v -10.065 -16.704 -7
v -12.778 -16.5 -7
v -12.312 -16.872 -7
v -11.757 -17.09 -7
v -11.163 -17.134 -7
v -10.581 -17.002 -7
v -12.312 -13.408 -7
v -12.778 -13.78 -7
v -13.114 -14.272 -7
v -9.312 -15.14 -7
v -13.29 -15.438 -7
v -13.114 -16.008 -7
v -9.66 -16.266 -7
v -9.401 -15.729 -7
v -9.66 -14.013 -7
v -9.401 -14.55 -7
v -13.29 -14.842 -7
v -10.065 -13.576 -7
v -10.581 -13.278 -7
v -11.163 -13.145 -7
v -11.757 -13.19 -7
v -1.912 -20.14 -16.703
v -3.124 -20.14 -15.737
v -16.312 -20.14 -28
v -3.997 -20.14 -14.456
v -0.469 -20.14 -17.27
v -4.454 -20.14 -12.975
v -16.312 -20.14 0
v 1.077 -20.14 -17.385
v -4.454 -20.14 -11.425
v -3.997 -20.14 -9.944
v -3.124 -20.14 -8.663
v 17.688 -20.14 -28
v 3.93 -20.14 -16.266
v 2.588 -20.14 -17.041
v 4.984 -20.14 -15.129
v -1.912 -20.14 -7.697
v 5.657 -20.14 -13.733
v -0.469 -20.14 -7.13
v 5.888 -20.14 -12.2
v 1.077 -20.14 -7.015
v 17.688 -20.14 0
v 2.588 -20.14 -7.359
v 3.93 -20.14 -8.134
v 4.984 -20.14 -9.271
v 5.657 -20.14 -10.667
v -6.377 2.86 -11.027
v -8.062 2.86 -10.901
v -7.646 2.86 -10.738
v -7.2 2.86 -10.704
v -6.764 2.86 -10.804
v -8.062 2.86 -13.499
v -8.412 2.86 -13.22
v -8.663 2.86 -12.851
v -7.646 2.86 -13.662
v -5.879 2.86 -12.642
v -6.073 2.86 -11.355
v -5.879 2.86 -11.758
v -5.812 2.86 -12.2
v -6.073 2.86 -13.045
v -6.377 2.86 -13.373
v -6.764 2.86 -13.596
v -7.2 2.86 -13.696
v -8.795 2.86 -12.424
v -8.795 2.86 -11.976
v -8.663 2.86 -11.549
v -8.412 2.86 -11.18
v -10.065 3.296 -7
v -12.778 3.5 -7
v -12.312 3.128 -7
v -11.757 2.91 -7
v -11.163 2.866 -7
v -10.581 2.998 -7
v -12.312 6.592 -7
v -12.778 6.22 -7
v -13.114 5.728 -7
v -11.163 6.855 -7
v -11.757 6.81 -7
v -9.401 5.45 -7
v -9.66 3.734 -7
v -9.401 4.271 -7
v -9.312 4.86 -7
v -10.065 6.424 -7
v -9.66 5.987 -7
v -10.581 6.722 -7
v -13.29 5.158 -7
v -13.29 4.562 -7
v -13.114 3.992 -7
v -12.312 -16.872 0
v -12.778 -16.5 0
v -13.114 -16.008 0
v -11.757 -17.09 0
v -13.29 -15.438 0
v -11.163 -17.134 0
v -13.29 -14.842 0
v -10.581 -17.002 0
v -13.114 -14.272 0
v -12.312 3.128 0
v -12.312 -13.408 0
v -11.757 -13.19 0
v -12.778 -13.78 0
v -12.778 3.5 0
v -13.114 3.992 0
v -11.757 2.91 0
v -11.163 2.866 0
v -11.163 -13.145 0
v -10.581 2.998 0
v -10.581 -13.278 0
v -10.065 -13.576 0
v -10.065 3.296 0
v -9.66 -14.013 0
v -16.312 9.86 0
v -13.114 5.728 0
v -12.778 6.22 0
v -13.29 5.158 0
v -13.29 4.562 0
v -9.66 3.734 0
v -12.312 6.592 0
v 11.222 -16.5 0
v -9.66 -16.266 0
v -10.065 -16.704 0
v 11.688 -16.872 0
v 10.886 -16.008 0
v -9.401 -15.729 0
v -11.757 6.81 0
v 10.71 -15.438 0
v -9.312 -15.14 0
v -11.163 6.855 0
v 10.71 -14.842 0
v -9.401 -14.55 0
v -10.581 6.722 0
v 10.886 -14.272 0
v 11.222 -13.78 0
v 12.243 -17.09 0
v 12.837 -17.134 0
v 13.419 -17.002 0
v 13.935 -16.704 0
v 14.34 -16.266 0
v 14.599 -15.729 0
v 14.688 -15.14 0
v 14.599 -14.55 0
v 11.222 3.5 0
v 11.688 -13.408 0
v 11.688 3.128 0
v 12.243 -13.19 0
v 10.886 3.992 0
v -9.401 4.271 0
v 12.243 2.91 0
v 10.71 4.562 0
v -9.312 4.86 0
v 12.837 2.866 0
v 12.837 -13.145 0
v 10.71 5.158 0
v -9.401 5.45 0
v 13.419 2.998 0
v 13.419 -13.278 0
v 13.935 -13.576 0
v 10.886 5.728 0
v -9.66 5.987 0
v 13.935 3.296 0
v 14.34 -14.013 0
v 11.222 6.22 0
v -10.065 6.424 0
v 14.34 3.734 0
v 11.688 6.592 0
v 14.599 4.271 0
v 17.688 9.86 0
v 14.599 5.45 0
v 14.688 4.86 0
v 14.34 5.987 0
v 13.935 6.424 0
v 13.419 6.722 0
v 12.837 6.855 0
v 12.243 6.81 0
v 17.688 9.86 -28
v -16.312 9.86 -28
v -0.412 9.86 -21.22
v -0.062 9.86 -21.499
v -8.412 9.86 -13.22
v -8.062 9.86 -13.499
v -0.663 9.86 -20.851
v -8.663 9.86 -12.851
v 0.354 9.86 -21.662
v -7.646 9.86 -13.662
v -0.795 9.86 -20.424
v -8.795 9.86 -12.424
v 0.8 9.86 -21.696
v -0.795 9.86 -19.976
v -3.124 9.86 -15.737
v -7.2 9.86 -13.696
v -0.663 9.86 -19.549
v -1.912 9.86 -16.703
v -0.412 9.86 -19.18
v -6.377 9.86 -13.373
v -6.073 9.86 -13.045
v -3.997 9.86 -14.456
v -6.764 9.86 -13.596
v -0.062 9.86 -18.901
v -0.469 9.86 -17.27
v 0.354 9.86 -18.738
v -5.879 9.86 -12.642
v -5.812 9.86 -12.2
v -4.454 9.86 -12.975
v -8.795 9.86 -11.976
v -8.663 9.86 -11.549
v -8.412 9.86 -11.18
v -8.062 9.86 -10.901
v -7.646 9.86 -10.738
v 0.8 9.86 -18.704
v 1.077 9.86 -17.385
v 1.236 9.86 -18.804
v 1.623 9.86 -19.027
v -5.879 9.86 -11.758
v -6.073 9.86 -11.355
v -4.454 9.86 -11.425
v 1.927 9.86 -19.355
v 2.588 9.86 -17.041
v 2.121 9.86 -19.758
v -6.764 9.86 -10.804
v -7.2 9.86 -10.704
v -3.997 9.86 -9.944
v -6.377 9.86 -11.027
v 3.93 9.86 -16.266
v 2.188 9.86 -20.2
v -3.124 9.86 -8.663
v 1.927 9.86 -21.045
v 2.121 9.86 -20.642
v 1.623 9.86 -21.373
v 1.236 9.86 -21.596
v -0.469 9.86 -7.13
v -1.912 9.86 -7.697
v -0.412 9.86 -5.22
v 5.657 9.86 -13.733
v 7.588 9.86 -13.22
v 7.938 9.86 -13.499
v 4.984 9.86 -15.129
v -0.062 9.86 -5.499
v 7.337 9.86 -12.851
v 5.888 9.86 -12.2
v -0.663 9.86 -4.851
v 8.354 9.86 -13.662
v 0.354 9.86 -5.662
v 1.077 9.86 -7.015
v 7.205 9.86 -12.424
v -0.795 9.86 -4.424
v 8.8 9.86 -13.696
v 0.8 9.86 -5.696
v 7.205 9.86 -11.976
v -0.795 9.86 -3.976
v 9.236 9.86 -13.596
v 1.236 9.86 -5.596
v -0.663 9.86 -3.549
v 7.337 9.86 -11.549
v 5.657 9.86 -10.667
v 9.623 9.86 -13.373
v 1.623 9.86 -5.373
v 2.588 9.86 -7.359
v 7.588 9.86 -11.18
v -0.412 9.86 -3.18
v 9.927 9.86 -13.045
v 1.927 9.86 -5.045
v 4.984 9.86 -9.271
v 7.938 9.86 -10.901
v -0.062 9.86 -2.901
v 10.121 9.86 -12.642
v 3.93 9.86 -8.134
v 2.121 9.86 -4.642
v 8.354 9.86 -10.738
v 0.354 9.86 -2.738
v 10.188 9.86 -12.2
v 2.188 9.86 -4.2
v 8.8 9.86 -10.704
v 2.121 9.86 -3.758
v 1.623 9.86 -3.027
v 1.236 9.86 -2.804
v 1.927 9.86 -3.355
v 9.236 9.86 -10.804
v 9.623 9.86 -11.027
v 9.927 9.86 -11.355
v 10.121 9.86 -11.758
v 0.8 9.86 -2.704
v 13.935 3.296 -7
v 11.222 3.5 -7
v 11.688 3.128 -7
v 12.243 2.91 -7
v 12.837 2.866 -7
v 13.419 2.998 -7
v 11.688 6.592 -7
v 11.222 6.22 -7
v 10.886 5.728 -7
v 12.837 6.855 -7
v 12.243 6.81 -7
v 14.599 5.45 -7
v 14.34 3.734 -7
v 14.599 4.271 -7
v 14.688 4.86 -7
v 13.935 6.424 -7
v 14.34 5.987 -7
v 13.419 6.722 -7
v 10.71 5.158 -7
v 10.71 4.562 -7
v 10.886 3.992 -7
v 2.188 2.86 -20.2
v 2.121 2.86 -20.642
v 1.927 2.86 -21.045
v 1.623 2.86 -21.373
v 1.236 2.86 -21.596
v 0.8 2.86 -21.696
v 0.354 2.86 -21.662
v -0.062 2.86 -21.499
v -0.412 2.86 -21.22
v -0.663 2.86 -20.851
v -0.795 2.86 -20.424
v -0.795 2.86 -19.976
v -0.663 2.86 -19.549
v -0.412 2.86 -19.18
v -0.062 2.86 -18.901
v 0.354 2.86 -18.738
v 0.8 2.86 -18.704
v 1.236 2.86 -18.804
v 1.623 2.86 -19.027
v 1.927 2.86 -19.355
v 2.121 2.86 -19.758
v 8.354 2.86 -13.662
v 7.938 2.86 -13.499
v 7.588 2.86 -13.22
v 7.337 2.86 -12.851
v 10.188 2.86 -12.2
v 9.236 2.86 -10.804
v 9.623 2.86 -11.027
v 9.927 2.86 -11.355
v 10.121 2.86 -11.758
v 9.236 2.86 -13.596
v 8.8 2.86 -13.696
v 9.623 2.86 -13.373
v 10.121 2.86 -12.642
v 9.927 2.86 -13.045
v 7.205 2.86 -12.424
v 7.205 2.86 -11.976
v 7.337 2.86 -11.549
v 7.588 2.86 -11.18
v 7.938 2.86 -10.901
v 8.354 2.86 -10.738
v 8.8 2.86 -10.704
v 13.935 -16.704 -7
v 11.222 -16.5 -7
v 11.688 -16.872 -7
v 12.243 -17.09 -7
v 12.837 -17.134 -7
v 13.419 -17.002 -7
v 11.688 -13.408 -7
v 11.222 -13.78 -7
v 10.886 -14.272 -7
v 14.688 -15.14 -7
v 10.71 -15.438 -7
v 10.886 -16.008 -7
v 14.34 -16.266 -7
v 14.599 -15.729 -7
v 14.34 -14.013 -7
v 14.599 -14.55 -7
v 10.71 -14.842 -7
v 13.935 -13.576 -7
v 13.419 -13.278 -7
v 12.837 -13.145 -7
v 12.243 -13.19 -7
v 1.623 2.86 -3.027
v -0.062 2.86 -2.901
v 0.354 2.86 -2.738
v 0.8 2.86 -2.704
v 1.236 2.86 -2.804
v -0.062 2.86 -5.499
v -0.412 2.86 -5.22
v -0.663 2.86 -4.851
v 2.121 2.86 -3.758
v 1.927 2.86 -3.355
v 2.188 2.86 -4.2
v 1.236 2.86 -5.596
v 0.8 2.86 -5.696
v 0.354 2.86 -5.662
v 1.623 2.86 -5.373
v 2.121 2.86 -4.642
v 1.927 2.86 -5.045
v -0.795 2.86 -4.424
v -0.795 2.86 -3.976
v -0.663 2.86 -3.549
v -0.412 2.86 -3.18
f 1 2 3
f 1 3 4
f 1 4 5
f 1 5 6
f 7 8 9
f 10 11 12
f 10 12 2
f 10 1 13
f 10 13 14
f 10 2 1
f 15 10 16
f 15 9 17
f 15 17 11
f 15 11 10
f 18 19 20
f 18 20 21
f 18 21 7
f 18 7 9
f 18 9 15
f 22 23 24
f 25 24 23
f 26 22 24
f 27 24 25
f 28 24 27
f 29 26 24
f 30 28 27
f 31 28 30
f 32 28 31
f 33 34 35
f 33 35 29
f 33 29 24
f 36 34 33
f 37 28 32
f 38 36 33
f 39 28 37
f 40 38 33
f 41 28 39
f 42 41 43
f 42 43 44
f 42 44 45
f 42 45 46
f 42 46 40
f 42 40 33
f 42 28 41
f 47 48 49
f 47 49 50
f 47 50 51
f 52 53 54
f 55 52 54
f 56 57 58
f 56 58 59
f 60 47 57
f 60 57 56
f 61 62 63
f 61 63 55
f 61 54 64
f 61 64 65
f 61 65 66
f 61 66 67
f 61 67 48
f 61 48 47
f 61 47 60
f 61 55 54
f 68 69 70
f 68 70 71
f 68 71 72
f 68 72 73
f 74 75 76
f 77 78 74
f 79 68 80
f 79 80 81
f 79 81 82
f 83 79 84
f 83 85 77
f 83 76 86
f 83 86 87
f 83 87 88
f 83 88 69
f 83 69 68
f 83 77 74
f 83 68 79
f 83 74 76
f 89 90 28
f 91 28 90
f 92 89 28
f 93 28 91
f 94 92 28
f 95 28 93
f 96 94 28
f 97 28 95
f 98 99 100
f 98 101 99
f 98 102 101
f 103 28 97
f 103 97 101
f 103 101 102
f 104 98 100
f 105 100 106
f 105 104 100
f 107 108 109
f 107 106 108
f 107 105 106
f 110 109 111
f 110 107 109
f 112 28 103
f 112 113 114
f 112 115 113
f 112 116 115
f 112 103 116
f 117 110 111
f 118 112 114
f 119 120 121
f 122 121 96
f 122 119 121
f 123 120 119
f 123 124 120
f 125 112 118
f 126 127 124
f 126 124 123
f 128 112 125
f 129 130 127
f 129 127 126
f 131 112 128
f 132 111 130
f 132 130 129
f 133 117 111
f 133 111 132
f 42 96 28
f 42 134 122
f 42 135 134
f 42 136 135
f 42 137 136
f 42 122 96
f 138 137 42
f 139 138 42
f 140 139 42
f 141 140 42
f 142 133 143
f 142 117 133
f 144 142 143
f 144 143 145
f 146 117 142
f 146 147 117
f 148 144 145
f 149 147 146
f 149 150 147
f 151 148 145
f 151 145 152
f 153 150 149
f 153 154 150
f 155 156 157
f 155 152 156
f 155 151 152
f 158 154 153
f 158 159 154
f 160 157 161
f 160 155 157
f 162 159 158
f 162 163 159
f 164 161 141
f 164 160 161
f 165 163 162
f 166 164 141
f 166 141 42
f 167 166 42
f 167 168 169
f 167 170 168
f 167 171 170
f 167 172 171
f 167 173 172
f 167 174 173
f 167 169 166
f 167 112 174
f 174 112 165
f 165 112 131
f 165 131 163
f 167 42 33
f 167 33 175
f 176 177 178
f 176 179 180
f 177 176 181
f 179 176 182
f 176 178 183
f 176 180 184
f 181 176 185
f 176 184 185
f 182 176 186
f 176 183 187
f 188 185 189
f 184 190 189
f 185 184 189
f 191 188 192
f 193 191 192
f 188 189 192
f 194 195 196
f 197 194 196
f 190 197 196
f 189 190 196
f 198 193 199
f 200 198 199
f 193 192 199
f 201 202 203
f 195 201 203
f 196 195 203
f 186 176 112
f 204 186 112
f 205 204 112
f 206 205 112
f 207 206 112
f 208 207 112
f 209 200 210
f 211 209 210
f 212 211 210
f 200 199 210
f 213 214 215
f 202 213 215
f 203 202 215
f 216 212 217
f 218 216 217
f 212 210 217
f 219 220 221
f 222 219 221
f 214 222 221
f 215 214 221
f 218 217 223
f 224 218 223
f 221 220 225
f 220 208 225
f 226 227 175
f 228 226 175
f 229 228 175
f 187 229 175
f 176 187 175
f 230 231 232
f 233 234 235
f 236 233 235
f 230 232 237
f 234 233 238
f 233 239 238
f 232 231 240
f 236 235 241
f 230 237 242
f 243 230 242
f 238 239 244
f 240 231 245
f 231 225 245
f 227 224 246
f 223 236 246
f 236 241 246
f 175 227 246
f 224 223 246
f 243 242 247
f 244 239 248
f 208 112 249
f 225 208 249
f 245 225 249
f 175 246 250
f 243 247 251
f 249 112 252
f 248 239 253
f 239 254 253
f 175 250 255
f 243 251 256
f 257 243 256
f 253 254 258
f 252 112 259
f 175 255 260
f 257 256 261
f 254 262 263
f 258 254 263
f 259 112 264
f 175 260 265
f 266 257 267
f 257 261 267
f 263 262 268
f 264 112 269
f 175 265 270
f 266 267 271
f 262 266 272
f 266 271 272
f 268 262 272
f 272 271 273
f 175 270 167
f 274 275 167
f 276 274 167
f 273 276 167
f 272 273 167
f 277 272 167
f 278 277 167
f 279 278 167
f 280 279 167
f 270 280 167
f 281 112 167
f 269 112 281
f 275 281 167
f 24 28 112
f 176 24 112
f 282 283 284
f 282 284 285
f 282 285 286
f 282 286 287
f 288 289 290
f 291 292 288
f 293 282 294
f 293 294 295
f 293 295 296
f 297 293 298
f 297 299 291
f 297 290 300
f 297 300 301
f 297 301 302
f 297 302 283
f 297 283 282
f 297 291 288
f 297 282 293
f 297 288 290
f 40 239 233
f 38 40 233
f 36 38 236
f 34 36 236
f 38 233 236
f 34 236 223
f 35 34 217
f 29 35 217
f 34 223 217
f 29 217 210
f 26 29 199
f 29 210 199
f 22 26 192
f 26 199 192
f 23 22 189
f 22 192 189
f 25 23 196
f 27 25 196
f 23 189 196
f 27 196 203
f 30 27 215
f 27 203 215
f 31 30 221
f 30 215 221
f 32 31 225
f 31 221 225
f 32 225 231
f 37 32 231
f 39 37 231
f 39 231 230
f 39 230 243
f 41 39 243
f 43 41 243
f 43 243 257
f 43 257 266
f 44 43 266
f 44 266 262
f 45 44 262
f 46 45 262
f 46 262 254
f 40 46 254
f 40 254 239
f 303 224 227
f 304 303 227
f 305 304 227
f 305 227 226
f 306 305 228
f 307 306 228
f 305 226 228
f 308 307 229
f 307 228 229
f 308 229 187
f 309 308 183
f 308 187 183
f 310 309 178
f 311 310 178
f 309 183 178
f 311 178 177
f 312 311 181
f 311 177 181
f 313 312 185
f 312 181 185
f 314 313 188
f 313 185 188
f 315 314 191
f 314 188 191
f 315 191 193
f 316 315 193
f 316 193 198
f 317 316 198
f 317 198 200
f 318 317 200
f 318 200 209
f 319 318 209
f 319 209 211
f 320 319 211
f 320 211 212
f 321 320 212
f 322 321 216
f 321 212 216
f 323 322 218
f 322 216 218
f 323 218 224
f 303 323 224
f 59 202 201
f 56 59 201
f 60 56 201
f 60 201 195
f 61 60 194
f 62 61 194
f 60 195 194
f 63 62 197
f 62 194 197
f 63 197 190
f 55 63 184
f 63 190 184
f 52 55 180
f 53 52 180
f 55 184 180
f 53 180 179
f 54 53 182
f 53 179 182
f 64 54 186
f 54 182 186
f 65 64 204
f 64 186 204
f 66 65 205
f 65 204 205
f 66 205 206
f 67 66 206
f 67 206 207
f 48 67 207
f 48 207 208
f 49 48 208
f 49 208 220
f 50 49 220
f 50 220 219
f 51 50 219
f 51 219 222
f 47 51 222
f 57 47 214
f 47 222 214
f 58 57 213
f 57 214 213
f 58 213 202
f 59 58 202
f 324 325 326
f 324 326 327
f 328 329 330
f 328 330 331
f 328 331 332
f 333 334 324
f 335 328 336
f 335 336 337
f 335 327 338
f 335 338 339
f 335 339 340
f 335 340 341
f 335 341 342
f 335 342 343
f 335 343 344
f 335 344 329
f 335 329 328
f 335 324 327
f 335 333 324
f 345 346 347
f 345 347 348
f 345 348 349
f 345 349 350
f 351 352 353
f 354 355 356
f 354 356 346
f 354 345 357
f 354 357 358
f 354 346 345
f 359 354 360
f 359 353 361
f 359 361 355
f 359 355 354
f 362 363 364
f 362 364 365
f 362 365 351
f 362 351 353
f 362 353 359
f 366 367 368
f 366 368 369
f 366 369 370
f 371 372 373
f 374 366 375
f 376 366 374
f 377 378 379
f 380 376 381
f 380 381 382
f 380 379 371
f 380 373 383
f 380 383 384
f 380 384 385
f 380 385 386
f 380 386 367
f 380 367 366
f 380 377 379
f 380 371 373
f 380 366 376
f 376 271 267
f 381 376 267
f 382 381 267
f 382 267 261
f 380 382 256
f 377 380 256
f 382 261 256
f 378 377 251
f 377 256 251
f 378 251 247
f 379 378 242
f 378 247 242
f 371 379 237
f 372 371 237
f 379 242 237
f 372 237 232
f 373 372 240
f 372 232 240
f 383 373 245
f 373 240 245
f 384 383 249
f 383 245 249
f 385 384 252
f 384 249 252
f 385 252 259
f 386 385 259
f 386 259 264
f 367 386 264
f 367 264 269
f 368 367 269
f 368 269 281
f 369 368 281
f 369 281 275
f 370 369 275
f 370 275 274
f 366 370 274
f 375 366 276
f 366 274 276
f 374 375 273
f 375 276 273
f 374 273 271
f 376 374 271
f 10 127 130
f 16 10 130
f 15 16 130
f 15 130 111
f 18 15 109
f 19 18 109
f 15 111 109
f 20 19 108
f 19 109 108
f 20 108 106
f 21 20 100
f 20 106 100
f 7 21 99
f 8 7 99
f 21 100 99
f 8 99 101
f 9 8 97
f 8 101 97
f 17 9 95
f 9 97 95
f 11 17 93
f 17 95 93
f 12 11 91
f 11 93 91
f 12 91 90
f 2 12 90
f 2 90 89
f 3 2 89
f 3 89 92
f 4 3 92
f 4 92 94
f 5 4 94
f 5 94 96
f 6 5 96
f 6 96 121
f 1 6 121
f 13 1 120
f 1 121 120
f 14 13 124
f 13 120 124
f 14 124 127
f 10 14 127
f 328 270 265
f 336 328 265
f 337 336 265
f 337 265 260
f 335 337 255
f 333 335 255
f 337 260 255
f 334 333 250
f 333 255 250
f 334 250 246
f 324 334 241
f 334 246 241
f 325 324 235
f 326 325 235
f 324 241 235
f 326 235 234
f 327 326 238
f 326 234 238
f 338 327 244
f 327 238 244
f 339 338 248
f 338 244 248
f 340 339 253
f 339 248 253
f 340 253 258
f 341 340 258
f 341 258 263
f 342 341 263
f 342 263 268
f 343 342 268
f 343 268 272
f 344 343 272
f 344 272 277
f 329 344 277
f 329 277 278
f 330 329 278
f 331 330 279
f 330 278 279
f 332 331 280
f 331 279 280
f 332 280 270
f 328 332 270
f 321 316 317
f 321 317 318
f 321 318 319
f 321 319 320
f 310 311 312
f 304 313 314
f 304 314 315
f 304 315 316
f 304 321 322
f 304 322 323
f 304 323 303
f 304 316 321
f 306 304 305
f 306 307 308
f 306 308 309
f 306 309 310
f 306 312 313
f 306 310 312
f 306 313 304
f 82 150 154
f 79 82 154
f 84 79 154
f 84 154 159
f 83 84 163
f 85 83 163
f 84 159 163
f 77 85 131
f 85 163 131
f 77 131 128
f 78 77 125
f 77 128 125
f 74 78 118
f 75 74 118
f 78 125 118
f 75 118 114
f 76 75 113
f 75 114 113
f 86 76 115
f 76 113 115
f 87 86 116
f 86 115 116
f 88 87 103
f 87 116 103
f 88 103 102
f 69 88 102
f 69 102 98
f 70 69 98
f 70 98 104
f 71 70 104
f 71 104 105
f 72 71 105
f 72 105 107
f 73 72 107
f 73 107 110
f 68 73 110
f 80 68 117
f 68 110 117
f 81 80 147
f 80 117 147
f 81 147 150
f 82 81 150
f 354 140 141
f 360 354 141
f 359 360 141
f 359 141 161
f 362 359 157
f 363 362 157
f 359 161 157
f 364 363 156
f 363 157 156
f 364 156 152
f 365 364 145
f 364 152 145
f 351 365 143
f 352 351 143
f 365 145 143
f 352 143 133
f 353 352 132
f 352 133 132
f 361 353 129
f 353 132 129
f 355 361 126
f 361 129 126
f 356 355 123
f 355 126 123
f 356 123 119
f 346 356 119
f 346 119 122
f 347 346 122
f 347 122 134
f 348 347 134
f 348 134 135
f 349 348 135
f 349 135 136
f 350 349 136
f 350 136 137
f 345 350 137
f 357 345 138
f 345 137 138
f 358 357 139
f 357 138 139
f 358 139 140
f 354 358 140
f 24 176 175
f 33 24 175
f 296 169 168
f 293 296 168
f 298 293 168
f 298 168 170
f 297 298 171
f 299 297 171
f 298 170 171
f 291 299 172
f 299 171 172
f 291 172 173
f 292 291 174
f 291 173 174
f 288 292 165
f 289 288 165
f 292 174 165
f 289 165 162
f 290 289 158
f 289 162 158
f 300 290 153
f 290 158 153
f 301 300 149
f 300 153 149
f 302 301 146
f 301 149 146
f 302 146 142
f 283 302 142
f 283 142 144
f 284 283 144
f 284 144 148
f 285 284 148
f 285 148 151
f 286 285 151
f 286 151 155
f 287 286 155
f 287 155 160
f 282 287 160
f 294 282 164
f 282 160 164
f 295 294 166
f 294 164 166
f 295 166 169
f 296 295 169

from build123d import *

# Parameters (mm, degrees)
SKETCH_1_W          = 34
SKETCH_1_H          = 30
EXTRUDE_1_DEPTH     = 28
SKETCH_2_R          = 2
CUT_EXTRUDE_1_DEPTH = 7
SKETCH_3_R          = 5.2
CUT_EXTRUDE_3_DEPTH = 31
SKETCH_5_R          = 1.5
CUT_EXTRUDE_4_DEPTH = 7


with BuildPart() as part:
    # 草图1 → 凸台-拉伸1 (new body)
    with BuildSketch(Plane.XY):
        with Locations((0.688013078, -5.139852888)):
            Rectangle(SKETCH_1_W, SKETCH_1_H)
    extrude(amount=-EXTRUDE_1_DEPTH)

    # 草图2 → 切除-拉伸1 (cut)
    with BuildSketch(Plane.XY):
        with Locations((-11.311986922, 4.86014711)):
            Circle(SKETCH_2_R)
        with Locations((12.688013078, 4.86014711)):
            Circle(SKETCH_2_R)
        with Locations((12.688013078, -15.13985289)):
            Circle(SKETCH_2_R)
        with Locations((-11.311986922, -15.13985289)):
            Circle(SKETCH_2_R)
    extrude(amount=-CUT_EXTRUDE_1_DEPTH, mode=Mode.SUBTRACT)

    # 草图3 → 切除-拉伸3 (cut, through all)
    with BuildSketch(Plane(origin=(0, 9.860147112, 0), x_dir=(1, 0, 0), z_dir=(0, 1, 0))):
        with Locations((0.688013078, 12.2)):
            Circle(SKETCH_3_R)
    extrude(amount=-CUT_EXTRUDE_3_DEPTH, mode=Mode.SUBTRACT)

    # 草图5 → 切除-拉伸4 (cut)
    with BuildSketch(Plane(origin=(0, 9.860147112, 0), x_dir=(1, 0, 0), z_dir=(0, 1, 0))):
        with Locations((0.688013078, 4.2)):
            Circle(SKETCH_5_R)
        with Locations((8.688013078, 12.2)):
            Circle(SKETCH_5_R)
        with Locations((0.688013078, 20.2)):
            Circle(SKETCH_5_R)
        with Locations((-7.311986922, 12.2)):
            Circle(SKETCH_5_R)
    extrude(amount=-CUT_EXTRUDE_4_DEPTH, mode=Mode.SUBTRACT)


solid = part.part
